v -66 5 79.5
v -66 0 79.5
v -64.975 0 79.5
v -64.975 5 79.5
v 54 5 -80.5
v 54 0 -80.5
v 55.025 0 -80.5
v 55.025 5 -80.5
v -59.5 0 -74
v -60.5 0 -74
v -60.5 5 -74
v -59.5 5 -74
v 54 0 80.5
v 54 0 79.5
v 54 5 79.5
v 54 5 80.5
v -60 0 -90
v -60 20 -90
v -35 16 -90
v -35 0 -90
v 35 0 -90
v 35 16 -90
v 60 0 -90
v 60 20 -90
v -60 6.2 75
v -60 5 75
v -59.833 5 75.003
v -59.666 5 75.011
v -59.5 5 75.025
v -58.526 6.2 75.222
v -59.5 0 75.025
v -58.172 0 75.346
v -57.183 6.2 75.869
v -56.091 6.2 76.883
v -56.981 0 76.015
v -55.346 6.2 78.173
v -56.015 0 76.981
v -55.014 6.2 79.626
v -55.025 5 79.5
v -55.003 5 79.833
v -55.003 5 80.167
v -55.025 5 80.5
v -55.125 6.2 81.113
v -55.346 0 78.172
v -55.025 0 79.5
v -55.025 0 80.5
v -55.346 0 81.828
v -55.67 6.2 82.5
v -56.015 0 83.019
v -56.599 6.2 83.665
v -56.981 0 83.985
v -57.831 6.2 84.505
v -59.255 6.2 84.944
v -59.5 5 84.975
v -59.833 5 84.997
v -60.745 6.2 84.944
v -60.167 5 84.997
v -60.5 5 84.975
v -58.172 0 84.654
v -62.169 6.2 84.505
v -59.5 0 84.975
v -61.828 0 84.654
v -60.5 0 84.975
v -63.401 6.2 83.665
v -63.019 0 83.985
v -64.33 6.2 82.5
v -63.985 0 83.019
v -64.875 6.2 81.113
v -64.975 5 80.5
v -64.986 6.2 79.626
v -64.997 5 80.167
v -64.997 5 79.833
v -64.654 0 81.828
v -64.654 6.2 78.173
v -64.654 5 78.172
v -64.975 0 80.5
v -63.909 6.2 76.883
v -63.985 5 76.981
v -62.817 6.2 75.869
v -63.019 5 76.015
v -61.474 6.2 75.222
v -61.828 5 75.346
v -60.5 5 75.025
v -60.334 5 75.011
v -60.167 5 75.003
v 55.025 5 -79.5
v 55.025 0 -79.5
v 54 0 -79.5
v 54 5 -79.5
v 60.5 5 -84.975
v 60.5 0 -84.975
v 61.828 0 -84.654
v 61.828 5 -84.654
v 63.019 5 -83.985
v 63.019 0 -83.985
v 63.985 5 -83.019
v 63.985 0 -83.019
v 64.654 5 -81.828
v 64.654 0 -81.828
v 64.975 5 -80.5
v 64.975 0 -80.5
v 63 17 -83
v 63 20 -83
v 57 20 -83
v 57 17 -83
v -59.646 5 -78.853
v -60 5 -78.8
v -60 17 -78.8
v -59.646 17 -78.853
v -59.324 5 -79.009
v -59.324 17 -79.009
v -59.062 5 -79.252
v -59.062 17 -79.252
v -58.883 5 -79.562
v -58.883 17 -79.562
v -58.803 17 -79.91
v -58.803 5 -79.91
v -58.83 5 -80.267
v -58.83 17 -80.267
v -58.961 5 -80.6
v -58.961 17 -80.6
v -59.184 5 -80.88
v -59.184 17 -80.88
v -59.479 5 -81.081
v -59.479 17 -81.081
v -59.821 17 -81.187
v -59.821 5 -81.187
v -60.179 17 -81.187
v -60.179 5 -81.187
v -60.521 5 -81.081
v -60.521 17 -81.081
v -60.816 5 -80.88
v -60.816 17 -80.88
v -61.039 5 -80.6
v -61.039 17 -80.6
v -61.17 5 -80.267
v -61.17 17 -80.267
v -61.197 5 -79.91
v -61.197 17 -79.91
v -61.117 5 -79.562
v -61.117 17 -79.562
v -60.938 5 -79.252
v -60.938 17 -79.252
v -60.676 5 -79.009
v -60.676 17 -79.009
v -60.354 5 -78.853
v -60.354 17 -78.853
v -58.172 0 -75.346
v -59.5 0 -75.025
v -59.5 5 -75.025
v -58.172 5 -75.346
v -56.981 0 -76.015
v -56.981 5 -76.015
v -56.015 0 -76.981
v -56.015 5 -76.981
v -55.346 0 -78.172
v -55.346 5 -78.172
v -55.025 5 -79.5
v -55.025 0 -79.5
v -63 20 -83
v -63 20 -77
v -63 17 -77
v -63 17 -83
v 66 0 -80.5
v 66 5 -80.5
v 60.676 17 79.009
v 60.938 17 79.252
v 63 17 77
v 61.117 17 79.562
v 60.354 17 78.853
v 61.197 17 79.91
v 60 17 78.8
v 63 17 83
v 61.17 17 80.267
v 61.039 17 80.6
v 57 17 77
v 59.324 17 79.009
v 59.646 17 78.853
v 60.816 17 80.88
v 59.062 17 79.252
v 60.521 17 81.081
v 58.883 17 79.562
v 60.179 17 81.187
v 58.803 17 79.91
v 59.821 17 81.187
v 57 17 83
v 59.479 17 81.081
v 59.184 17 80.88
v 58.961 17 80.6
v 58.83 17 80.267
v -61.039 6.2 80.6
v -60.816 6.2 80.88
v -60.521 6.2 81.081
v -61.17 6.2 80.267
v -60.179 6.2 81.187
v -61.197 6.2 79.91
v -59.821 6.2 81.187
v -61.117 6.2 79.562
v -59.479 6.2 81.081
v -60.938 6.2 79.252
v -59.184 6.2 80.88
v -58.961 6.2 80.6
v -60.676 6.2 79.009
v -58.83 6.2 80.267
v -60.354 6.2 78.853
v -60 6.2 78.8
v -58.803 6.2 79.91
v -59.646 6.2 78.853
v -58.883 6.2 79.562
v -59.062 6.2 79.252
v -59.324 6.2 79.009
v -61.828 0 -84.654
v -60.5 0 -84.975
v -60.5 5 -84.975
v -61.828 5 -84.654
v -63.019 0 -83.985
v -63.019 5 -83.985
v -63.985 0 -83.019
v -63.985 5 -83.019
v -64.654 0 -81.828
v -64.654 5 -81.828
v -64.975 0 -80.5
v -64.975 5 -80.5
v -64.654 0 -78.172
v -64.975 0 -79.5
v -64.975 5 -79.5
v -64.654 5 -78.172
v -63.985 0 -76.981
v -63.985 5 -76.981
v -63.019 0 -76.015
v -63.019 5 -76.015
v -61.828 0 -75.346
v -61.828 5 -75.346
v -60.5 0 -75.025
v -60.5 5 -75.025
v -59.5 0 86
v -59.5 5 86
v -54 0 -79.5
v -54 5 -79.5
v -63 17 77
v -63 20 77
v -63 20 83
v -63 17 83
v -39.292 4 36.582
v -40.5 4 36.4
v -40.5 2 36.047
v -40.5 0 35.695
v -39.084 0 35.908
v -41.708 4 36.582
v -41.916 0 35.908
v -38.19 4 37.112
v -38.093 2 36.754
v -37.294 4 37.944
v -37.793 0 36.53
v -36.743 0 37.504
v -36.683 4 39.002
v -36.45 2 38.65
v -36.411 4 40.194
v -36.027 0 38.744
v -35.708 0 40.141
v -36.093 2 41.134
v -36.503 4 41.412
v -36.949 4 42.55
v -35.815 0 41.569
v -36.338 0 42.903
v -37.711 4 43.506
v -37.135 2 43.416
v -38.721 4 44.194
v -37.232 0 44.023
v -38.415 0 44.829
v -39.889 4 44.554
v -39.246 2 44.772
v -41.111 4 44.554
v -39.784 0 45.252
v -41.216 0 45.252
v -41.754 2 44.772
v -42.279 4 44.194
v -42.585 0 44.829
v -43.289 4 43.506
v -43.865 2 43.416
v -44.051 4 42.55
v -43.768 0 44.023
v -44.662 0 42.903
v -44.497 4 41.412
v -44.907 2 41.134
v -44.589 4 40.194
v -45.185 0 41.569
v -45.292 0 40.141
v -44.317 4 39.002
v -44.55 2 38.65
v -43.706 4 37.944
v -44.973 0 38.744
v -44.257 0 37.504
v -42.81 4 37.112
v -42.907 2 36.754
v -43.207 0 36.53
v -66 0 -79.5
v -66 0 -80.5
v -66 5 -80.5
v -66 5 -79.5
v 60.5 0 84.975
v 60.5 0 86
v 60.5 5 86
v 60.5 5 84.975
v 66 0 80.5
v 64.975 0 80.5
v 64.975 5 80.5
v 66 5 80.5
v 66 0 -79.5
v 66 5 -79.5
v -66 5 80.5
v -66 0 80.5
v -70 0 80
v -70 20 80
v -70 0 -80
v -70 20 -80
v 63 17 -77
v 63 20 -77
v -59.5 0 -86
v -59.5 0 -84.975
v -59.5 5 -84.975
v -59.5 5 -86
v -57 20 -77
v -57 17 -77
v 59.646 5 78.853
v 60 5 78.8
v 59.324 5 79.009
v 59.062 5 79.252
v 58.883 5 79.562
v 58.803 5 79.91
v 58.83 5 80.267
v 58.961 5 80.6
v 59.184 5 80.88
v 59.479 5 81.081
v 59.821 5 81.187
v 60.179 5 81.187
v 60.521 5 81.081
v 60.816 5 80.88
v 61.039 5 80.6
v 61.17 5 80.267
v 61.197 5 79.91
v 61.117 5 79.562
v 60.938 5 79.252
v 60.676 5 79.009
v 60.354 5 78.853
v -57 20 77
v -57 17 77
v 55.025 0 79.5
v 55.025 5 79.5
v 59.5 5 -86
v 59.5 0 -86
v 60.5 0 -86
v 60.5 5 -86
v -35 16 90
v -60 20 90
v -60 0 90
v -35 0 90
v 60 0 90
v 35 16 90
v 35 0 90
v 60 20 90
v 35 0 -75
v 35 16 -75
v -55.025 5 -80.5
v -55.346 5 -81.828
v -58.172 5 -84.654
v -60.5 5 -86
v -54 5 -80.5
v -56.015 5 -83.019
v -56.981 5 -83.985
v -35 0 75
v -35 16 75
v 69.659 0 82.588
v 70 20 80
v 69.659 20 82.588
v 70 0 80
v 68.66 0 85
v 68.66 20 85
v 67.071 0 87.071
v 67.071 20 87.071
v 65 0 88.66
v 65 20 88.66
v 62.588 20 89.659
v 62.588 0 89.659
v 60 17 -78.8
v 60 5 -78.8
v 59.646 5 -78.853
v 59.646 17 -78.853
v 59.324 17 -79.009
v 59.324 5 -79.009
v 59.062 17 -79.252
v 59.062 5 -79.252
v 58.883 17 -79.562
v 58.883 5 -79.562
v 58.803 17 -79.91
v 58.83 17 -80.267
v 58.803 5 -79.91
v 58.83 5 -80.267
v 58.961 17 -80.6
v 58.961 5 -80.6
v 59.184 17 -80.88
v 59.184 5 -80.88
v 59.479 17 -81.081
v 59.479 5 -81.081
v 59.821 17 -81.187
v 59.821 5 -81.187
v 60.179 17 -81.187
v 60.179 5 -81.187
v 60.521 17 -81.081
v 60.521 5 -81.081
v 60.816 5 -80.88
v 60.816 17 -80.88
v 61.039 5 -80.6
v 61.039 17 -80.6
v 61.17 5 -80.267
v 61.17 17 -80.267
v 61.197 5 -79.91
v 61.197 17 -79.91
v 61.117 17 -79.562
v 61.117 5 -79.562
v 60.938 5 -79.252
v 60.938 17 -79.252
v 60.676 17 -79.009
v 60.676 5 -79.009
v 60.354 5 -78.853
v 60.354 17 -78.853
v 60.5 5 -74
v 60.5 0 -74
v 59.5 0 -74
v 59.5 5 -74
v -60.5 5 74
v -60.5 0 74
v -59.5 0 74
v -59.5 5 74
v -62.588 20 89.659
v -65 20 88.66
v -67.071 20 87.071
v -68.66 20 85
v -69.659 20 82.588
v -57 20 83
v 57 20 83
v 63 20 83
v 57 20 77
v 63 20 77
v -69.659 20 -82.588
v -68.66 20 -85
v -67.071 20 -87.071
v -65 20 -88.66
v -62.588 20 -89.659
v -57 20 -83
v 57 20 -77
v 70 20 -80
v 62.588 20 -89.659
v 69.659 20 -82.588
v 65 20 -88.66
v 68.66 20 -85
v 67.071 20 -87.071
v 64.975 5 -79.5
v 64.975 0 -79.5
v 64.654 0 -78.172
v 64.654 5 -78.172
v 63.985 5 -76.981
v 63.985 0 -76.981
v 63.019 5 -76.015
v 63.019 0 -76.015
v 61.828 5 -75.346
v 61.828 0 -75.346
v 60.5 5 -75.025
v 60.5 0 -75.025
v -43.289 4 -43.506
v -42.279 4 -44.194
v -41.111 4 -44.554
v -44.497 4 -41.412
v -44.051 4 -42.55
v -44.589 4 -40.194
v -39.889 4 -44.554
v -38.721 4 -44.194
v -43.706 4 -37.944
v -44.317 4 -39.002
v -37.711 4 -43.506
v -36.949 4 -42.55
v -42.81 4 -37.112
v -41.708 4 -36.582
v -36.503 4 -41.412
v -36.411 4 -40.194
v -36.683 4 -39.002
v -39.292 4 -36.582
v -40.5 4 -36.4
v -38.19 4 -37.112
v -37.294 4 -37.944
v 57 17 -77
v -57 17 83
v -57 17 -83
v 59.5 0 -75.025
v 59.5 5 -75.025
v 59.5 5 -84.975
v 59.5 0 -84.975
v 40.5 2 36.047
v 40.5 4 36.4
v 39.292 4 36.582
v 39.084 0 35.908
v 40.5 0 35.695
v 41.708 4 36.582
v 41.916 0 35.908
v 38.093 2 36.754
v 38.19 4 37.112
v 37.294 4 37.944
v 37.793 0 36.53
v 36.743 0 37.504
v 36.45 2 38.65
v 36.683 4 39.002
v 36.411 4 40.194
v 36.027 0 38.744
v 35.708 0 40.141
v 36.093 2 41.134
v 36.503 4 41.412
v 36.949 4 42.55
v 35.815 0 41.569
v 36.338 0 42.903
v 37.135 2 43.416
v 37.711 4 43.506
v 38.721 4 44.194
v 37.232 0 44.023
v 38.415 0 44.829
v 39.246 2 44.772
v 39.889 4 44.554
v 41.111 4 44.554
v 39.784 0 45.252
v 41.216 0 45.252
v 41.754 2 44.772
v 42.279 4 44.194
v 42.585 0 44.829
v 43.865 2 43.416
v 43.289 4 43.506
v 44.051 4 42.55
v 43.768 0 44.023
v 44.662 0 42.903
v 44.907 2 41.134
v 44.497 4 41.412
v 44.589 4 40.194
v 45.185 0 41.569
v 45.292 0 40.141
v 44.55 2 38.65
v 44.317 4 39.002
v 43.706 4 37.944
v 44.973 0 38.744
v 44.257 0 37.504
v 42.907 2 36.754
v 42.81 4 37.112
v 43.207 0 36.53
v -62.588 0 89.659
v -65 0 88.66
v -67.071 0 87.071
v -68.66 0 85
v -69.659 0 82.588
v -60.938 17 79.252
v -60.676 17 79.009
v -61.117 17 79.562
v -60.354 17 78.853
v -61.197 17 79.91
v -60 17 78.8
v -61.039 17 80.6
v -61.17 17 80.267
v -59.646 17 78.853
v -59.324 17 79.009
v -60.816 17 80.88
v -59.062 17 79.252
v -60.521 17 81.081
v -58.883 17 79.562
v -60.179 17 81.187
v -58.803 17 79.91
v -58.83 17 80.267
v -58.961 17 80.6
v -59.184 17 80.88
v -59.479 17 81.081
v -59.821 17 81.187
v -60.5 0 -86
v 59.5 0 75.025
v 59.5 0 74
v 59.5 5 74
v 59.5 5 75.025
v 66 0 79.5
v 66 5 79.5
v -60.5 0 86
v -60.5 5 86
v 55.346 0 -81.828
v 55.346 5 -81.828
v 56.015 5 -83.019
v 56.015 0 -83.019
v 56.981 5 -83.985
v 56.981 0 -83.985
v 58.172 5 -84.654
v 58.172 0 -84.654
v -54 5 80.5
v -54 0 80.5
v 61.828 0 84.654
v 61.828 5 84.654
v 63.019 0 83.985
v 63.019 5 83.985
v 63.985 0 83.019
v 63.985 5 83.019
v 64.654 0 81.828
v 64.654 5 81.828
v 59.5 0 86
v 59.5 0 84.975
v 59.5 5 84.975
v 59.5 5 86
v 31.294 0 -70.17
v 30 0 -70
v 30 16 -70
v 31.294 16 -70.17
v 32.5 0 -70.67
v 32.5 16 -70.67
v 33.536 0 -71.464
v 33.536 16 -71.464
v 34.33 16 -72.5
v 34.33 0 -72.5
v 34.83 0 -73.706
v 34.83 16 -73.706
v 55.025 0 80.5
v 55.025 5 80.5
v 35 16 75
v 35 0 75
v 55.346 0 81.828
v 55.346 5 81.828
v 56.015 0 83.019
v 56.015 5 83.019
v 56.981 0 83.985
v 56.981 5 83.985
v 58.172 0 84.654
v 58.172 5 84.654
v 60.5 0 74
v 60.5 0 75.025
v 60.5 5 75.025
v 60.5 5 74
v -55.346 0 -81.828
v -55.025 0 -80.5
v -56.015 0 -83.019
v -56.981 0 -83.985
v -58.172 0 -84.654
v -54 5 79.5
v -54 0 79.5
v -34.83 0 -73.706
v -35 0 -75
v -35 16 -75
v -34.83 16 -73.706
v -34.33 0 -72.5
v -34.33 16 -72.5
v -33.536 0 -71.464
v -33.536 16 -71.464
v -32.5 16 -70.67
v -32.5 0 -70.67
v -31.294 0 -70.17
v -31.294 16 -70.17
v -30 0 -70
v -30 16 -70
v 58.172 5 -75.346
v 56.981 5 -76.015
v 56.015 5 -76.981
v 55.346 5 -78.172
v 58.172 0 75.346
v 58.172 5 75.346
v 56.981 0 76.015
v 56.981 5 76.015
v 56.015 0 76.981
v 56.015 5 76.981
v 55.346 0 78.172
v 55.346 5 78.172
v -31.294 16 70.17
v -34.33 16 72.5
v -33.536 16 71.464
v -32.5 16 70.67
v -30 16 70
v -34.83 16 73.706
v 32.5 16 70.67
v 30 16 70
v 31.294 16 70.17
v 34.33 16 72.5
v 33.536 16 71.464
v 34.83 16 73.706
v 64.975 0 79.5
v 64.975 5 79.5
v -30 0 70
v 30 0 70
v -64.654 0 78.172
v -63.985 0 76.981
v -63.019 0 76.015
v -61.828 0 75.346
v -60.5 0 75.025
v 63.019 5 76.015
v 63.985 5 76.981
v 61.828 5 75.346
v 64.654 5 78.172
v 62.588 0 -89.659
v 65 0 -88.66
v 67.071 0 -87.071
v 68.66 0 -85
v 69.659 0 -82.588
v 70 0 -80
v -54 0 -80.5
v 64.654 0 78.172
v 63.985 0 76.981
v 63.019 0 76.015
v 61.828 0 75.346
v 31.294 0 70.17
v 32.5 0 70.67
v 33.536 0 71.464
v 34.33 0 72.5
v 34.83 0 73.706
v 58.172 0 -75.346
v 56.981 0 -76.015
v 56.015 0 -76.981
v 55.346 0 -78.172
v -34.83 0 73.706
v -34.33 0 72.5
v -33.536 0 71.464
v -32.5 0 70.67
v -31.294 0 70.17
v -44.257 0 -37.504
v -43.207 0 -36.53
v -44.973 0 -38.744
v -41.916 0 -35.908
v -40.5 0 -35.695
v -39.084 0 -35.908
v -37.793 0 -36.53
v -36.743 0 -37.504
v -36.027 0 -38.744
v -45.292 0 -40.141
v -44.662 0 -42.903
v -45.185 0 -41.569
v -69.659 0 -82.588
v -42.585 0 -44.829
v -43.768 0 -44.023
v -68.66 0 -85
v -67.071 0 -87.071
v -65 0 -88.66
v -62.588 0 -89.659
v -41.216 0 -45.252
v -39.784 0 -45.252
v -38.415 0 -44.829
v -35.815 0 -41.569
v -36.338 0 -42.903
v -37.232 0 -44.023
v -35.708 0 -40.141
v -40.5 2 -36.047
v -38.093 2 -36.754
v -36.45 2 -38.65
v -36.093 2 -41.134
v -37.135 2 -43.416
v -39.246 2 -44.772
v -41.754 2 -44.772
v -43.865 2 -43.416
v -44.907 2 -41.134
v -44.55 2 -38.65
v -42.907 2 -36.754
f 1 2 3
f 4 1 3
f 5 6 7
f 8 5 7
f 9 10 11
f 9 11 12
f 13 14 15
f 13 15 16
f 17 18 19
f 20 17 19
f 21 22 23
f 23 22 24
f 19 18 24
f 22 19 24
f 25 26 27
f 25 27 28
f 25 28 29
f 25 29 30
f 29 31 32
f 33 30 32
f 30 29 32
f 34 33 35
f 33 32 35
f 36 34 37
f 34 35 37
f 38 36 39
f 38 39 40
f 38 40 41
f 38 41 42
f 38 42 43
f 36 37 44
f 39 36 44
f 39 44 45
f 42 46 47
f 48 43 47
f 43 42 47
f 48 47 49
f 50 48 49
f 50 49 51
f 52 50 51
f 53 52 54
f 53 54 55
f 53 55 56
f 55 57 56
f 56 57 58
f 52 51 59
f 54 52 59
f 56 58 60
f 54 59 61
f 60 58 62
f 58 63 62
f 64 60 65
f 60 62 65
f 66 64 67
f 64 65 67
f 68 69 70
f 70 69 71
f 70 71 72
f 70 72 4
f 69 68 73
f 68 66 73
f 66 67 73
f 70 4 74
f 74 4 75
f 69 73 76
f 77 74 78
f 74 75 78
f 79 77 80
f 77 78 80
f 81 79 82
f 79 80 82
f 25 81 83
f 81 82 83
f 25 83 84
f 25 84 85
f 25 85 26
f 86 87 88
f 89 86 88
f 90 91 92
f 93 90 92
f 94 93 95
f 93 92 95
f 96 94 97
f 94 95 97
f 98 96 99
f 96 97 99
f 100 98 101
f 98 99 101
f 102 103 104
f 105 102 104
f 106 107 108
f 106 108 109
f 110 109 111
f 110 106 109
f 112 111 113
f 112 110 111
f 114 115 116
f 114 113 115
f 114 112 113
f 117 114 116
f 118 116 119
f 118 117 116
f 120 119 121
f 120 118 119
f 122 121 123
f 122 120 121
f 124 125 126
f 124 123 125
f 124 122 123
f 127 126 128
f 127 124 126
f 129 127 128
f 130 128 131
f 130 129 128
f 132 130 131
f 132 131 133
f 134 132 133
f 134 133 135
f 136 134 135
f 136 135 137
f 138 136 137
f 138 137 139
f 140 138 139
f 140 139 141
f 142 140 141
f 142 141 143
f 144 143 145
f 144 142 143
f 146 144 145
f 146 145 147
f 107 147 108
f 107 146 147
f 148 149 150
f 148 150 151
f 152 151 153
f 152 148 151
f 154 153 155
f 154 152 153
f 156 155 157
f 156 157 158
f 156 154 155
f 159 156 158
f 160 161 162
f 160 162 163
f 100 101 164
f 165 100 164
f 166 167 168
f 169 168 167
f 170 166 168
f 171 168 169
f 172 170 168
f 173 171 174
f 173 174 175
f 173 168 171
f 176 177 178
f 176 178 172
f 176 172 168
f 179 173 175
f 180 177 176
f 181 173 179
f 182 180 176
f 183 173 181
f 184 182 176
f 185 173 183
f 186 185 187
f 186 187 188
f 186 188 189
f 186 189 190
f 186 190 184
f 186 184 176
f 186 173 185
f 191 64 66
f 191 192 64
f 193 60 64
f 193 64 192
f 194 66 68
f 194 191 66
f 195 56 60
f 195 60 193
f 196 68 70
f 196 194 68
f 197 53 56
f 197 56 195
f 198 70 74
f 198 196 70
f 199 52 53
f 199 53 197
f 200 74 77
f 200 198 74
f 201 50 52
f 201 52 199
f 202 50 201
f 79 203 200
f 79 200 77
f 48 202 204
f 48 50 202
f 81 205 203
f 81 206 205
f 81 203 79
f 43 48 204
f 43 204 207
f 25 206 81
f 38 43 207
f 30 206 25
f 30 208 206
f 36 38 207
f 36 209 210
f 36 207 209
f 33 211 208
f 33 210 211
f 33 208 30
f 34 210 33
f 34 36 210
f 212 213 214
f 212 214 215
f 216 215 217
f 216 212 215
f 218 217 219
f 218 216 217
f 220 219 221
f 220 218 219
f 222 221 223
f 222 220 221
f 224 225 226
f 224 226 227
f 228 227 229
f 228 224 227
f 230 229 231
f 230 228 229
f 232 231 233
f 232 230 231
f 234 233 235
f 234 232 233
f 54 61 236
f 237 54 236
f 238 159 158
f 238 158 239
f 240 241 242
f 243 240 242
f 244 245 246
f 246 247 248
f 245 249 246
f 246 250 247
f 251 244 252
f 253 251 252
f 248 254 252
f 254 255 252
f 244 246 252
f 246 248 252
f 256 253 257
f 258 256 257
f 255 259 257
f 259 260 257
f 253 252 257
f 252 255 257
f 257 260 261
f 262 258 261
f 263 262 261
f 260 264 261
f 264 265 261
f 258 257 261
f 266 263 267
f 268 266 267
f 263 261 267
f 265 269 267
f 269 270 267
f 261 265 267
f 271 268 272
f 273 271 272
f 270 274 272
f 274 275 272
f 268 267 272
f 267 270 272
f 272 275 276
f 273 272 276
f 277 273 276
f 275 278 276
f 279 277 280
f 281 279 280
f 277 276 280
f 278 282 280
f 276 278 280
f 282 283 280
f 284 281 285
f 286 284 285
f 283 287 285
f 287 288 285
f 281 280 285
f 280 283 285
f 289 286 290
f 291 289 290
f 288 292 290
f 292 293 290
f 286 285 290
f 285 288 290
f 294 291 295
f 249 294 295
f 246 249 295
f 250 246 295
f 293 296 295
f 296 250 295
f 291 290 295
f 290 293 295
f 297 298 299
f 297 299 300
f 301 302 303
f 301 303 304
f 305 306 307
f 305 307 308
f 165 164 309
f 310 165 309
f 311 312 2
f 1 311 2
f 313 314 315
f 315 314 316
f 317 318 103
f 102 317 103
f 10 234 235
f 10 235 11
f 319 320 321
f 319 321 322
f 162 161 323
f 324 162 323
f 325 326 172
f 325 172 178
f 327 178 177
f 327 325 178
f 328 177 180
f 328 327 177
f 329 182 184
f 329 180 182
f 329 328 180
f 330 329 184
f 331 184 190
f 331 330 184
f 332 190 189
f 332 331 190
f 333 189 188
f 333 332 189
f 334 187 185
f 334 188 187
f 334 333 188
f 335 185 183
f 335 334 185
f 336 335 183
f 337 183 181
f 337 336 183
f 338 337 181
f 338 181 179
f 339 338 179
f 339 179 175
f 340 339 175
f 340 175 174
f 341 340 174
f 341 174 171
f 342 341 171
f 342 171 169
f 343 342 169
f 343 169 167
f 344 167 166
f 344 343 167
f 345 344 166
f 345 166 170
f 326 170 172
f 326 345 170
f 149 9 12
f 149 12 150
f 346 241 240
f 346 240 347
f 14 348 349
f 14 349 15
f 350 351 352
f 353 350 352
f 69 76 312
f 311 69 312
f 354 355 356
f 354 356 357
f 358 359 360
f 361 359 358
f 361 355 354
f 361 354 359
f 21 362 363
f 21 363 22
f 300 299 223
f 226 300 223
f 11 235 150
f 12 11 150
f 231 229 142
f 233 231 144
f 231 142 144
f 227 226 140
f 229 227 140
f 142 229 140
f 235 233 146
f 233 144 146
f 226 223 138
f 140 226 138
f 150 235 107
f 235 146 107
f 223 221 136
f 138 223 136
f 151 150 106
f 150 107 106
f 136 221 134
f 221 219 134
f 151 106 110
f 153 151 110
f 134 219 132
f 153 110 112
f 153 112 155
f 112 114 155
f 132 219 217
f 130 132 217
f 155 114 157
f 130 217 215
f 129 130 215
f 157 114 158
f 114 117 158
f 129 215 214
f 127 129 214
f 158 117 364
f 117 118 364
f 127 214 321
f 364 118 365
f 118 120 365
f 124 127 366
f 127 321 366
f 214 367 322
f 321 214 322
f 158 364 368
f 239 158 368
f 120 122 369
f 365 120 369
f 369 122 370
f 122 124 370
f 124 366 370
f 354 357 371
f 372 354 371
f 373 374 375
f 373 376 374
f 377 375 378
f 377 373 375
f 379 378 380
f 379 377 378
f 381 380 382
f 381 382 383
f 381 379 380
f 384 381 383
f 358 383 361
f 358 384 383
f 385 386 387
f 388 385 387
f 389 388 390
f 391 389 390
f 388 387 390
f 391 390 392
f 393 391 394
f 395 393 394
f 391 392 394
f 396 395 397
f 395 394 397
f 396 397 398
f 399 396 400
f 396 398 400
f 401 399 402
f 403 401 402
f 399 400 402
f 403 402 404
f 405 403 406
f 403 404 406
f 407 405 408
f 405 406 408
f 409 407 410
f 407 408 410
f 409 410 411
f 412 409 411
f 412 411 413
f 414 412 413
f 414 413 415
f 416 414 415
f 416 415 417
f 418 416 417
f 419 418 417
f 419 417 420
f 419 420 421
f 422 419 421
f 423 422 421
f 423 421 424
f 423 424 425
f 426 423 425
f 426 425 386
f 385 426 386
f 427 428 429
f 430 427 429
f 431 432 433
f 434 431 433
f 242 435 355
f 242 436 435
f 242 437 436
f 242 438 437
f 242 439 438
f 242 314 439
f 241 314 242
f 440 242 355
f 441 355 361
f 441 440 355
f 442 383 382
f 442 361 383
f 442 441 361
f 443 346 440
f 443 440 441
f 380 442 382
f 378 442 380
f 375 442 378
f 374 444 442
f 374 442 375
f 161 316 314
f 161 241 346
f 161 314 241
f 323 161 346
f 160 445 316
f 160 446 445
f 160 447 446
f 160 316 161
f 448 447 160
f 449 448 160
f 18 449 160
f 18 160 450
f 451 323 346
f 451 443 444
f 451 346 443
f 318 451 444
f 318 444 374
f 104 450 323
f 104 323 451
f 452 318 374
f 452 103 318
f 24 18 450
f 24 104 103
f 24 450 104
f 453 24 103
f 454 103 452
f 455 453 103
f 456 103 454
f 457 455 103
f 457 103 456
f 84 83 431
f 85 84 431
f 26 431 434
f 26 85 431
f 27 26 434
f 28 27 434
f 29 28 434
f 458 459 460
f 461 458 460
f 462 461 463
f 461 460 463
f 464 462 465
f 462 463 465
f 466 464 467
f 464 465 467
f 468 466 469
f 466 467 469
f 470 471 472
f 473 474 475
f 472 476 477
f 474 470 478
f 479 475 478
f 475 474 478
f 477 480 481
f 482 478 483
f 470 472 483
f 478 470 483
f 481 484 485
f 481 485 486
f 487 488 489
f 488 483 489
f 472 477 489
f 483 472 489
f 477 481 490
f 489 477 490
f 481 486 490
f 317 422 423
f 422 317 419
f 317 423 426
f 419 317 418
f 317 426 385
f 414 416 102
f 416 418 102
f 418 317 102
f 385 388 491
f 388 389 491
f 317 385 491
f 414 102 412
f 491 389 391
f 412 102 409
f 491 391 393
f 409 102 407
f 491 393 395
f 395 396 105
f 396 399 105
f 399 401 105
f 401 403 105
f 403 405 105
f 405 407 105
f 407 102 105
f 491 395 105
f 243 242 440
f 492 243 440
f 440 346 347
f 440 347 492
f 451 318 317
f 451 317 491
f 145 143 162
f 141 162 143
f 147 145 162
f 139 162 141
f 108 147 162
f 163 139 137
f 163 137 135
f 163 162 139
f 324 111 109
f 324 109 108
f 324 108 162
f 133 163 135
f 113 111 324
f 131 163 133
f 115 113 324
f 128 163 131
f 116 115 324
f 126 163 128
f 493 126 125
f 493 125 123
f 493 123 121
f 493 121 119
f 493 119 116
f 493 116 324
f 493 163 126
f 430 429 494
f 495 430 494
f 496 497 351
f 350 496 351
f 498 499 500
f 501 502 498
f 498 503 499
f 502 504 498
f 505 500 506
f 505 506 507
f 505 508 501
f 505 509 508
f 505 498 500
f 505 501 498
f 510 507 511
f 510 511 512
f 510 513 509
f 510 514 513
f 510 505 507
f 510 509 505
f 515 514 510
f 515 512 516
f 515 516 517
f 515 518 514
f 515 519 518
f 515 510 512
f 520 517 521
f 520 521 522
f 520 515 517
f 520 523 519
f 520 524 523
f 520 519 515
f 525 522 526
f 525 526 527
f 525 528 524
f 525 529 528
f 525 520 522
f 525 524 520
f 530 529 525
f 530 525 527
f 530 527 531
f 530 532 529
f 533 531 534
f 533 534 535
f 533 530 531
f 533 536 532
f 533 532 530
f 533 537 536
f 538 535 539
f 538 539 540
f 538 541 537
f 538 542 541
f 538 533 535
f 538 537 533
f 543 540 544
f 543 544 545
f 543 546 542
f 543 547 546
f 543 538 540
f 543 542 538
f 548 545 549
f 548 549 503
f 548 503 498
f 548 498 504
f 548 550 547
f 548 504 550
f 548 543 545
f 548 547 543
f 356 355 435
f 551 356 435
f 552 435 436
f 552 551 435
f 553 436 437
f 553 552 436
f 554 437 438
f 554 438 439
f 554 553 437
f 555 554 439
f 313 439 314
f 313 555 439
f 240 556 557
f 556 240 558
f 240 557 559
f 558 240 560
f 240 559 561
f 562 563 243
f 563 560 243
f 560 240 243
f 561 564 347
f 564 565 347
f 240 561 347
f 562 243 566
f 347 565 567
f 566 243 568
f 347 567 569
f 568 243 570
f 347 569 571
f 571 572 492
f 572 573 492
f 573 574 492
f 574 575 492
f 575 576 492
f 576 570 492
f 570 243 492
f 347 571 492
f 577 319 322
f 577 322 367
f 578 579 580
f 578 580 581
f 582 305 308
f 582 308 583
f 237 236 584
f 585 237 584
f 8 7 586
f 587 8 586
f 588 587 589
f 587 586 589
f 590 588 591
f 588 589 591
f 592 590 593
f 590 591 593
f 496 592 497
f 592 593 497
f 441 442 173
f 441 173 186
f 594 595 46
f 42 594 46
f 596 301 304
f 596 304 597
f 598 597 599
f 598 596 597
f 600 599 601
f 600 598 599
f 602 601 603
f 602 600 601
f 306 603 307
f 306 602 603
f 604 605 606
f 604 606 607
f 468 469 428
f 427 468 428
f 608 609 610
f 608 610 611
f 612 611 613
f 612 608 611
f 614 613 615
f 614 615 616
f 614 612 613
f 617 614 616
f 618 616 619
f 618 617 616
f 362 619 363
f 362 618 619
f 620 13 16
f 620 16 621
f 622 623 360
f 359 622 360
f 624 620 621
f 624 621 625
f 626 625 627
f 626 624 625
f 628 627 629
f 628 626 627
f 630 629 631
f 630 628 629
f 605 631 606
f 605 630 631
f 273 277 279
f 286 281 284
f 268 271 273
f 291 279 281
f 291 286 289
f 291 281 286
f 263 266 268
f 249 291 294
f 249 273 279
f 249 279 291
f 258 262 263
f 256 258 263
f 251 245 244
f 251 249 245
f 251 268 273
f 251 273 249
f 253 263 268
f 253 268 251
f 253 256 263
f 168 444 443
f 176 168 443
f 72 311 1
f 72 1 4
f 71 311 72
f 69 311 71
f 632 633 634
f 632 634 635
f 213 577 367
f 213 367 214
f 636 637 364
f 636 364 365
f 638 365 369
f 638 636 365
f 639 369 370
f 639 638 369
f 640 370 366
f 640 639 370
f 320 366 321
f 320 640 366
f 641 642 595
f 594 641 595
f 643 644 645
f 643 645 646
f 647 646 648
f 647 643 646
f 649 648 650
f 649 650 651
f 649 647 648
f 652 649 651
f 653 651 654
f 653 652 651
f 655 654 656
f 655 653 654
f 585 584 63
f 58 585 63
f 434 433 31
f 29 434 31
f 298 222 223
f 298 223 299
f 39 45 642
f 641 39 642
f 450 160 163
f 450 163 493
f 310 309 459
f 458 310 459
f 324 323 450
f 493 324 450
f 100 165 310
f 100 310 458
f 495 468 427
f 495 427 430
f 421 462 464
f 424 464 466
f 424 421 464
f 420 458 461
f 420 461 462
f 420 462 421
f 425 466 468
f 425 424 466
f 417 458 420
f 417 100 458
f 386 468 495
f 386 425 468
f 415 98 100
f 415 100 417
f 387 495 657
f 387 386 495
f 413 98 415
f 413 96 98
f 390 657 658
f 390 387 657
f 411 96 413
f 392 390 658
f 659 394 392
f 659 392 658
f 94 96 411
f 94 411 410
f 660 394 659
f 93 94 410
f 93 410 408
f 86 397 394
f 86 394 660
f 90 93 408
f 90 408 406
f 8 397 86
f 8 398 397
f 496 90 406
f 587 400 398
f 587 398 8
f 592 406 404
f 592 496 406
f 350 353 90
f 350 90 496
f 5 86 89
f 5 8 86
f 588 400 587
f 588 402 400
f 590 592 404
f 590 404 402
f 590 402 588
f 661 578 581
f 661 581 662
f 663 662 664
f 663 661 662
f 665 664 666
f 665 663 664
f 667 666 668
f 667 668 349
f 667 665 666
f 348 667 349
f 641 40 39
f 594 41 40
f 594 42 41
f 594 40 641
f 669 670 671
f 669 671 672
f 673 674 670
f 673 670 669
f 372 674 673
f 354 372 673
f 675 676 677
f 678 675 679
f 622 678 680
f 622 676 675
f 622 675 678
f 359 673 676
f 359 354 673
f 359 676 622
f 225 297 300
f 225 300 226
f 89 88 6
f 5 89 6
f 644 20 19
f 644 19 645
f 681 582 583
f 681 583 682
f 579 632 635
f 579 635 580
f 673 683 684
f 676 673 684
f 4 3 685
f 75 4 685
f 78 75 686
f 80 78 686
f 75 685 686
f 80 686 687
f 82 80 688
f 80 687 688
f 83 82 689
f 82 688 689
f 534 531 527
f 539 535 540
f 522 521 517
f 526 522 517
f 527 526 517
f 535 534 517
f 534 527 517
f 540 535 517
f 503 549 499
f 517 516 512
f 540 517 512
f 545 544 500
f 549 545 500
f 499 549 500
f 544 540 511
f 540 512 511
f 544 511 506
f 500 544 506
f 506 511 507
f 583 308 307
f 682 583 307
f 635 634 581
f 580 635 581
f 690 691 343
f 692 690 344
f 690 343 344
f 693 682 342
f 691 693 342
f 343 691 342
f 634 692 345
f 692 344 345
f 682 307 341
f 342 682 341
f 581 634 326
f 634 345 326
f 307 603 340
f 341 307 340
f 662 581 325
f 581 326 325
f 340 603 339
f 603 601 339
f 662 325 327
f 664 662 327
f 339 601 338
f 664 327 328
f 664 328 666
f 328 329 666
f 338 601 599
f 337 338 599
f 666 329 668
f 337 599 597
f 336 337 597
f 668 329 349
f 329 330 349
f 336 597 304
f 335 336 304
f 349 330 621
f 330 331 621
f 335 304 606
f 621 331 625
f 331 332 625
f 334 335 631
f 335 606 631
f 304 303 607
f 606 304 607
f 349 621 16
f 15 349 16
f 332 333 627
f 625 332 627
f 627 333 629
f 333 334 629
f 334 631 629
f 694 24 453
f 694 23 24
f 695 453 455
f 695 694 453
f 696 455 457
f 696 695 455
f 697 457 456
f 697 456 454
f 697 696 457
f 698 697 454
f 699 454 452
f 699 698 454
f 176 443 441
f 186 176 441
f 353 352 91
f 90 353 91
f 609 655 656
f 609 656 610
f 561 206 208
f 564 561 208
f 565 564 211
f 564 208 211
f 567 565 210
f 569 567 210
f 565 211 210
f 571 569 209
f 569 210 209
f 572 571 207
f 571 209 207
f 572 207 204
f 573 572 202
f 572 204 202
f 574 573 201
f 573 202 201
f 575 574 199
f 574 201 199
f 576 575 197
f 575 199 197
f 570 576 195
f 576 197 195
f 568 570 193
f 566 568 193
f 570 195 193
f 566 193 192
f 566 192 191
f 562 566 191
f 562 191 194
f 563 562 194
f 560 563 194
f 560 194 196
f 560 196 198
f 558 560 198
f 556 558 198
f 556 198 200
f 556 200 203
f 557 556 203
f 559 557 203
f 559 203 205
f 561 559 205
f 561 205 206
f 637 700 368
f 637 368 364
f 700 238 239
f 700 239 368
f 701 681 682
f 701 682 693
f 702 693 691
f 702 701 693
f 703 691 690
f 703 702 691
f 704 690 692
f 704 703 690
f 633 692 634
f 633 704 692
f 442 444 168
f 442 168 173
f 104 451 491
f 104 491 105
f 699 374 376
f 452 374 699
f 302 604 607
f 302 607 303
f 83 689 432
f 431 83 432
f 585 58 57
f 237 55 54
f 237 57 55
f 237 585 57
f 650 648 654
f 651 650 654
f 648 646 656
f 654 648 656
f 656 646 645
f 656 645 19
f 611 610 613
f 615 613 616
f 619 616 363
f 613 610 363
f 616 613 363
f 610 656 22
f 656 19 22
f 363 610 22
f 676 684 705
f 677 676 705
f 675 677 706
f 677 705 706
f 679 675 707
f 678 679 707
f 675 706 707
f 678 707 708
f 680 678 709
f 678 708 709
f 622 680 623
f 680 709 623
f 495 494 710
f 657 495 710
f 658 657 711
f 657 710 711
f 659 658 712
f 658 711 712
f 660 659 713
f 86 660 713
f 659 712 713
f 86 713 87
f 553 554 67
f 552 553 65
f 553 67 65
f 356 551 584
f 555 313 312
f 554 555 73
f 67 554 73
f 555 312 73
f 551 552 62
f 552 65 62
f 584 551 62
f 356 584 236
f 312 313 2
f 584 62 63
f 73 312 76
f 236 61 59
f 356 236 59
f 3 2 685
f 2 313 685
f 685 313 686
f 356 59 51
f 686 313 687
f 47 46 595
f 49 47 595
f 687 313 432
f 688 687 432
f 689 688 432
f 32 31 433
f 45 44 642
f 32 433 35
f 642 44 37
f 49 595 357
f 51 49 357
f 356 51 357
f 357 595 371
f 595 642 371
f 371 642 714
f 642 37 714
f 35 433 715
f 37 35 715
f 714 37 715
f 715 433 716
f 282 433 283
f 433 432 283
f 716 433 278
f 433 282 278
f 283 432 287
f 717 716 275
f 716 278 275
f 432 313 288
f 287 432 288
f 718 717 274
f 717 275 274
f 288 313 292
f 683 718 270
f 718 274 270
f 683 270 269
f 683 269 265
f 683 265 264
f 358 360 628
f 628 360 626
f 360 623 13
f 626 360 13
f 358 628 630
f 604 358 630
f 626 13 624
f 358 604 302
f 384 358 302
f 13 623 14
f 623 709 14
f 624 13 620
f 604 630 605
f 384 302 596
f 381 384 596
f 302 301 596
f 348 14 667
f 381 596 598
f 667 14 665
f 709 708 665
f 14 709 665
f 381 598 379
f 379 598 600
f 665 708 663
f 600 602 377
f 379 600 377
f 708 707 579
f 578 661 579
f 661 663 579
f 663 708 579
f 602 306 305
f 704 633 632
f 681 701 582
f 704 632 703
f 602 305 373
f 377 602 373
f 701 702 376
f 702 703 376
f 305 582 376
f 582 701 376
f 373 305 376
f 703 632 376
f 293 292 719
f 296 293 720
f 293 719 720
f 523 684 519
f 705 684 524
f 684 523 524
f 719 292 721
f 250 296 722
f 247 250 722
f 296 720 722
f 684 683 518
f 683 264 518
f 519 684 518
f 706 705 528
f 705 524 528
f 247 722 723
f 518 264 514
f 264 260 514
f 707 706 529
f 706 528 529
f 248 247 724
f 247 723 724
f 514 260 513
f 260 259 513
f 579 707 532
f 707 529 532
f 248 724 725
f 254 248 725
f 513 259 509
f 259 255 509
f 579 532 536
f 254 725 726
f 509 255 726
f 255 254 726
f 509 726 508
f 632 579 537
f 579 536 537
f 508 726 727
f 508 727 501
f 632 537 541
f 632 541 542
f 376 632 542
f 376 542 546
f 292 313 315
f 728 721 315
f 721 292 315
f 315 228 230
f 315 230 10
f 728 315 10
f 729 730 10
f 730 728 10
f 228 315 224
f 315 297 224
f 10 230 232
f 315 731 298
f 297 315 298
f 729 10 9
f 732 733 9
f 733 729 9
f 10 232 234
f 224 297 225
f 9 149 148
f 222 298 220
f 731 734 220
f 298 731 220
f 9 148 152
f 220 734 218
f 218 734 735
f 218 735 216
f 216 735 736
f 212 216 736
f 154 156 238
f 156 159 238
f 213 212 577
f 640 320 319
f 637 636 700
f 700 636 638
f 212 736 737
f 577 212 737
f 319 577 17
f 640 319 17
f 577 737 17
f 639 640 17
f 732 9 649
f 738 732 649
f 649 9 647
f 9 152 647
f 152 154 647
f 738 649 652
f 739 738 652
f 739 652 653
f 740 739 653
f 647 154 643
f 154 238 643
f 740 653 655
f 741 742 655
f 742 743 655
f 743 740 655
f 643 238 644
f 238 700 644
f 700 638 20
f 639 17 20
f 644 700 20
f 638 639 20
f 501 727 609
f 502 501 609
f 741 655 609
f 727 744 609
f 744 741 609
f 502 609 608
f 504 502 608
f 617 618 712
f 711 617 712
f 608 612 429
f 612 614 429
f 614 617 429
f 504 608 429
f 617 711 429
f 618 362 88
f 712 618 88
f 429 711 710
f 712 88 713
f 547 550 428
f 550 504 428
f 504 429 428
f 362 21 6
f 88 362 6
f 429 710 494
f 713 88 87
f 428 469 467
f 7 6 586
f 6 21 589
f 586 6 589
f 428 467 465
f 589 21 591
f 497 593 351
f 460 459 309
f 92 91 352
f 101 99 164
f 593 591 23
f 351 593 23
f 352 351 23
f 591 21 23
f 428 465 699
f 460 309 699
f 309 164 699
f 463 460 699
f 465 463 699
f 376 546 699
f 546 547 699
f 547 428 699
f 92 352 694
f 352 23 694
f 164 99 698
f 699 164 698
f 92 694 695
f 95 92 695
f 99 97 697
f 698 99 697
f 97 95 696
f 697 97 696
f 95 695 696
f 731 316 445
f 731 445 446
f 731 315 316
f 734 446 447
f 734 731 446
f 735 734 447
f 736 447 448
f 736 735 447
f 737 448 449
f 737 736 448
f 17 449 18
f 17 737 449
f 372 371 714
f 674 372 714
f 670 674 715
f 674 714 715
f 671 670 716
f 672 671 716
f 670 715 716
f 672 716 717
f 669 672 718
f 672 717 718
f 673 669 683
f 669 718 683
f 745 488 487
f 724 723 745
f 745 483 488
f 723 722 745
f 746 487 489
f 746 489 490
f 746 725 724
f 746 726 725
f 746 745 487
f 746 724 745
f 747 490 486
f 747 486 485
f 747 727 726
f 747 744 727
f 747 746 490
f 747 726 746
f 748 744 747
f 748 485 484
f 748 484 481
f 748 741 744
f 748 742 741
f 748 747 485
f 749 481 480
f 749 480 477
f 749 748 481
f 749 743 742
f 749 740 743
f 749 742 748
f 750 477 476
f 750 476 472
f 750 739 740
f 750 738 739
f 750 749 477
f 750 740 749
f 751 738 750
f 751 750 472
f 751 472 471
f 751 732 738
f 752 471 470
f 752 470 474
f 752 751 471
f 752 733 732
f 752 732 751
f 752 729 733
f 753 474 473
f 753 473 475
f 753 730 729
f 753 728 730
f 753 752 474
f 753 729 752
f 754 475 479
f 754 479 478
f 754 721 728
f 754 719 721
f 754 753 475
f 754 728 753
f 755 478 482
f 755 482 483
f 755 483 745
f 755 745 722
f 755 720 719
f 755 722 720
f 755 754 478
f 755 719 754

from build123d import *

# Parameters (mm, degrees)
SKETCH_1_W                                 = 200
SKETCH_1_H                                 = 200
EXTRUDE_1_DEPTH                            = 20
SKETCH_2_W                                 = 200
SKETCH_2_H                                 = 200
SKETCH_2_W_2                               = 140
SKETCH_2_H_2                               = 180
CUT_EXTRUDE_2_DEPTH                        = 143.828568571
FILLET_1_R                                 = 10
FILLET_2_R                                 = 10
FILLET_3_R                                 = 10
FILLET_4_R                                 = 10
CUT_EXTRUDE_4_DEPTH                        = 5
MIRROR_3_AT_THE_SECOND_PLANE_COPY_1_DEPTH  = 5
SKETCH_5_R                                 = 5
CUT_EXTRUDE_5_DEPTH                        = 6.2
CUT_EXTRUDE_7_DEPTH                        = 16
SKETCH_8_R                                 = 4.1
CUT_EXTRUDE_8_DEPTH                        = 4
DRAFT_2_ANGLE                              = 10
DRAFT_2_OF_MIRROR_10_2_ANGLE               = 10
DRAFT_2_OF_MIRROR_11_2_ANGLE               = 10
SKETCH_14_W                                = 6
SKETCH_14_H                                = 6
CUT_EXTRUDE_9_DEPTH                        = 3
MIRROR_12_AT_THE_SECOND_PLANE_COPY_1_SKE_W = 6
MIRROR_12_AT_THE_SECOND_PLANE_COPY_1_SKE_H = 6
MIRROR_12_AT_THE_SECOND_PLANE_COPY_1_DEPTH = 3
SKETCH_18_R                                = 1.2
CUT_EXTRUDE_11_DEPTH                       = 116.758369028
MIRROR_16_AT_THE_SECOND_PLANE_COPY_1_SKE_R = 1.2
MIRROR_16_AT_THE_SECOND_PLANE_COPY_1_DEPTH = 116.758369028


with BuildPart() as part:
    # 草图1 → 凸台-拉伸1 (new body)
    with BuildSketch(Plane(origin=(0, 0, 0), x_dir=(1, 0, 0), z_dir=(0, 1, 0))):
        Rectangle(SKETCH_1_W, SKETCH_1_H)
    extrude(amount=EXTRUDE_1_DEPTH)

    # 草图2 → 切除-拉伸2 (cut, through all)
    with BuildSketch(Plane(origin=(0, 20, 0), x_dir=(1, 0, 0), z_dir=(0, 1, 0))):
        Rectangle(SKETCH_2_W, SKETCH_2_H)
        Rectangle(SKETCH_2_W_2, SKETCH_2_H_2, mode=Mode.SUBTRACT)
    extrude(amount=-CUT_EXTRUDE_2_DEPTH, mode=Mode.SUBTRACT)

    # 圆角1
    fillet_1_edges = [part.edges().sort_by_distance(p)[0] for p in [
        (-70, 10, -90),
    ]]
    fillet(fillet_1_edges, radius=FILLET_1_R)

    # 圆角2
    fillet_2_edges = [part.edges().sort_by_distance(p)[0] for p in [
        (70, 10, -90),
    ]]
    fillet(fillet_2_edges, radius=FILLET_2_R)

    # 圆角3
    fillet_3_edges = [part.edges().sort_by_distance(p)[0] for p in [
        (70, 10, 90),
    ]]
    fillet(fillet_3_edges, radius=FILLET_3_R)

    # 圆角4
    fillet_4_edges = [part.edges().sort_by_distance(p)[0] for p in [
        (-70, 10, 90),
    ]]
    fillet(fillet_4_edges, radius=FILLET_4_R)

    # 草图4 → 切除-拉伸4 (cut)
    with BuildSketch(Plane.XZ):
        with BuildLine():
            Line((-59.5, 84.974937186), (-59.5, 86))
            Line((-59.5, 86), (-60.5, 86))
            Line((-60.5, 86), (-60.5, 84.974937186))
            ThreePointArc((-60.5, 84.974937186), (-63.535533906, 83.535533906), (-64.974937186, 80.5))
            Line((-64.974937186, 80.5), (-66, 80.5))
            Line((-66, 80.5), (-66, 79.5))
            Line((-66, 79.5), (-64.974937186, 79.5))
            ThreePointArc((-64.974937186, 79.5), (-63.535533906, 76.464466094), (-60.5, 75.025062814))
            Line((-60.5, 75.025062814), (-60.5, 74))
            Line((-60.5, 74), (-59.5, 74))
            Line((-59.5, 74), (-59.5, 75.025062814))
            ThreePointArc((-59.5, 75.025062814), (-56.464466094, 76.464466094), (-55.025062814, 79.5))
            Line((-55.025062814, 79.5), (-54, 79.5))
            Line((-54, 79.5), (-54, 80.5))
            Line((-54, 80.5), (-55.025062814, 80.5))
            ThreePointArc((-55.025062814, 80.5), (-56.464466094, 83.535533906), (-59.5, 84.974937186))
        make_face()
    cut_extrude_4 = extrude(amount=-CUT_EXTRUDE_4_DEPTH, mode=Mode.SUBTRACT)

    # 镜向3: 切除-拉伸4 across plane
    add(cut_extrude_4.mirror(Plane(origin=(0, 0, 0), x_dir=(0, 0, 1), z_dir=(1, 0, 0))), mode=Mode.SUBTRACT)

    # 镜向3 at the second plane: 切除-拉伸4 across plane
    add(cut_extrude_4.mirror(Plane.XY), mode=Mode.SUBTRACT)

    # 镜向3 at the second plane copy 1 sket → 镜向3 at the second plane copy 1 (cut)
    with BuildSketch(Plane(origin=(0, 0, 0), x_dir=(-1, 0, 0), z_dir=(0, -1, 0))):
        with BuildLine():
            Line((-59.5, 84.974937186), (-59.5, 86))
            Line((-59.5, 86), (-60.5, 86))
            Line((-60.5, 86), (-60.5, 84.974937186))
            ThreePointArc((-60.5, 84.974937186), (-63.535533906, 83.535533906), (-64.974937186, 80.5))
            Line((-64.974937186, 80.5), (-66, 80.5))
            Line((-66, 80.5), (-66, 79.5))
            Line((-66, 79.5), (-64.974937186, 79.5))
            ThreePointArc((-64.974937186, 79.5), (-63.535533906, 76.464466094), (-60.5, 75.025062814))
            Line((-60.5, 75.025062814), (-60.5, 74))
            Line((-60.5, 74), (-59.5, 74))
            Line((-59.5, 74), (-59.5, 75.025062814))
            ThreePointArc((-59.5, 75.025062814), (-56.464466094, 76.464466094), (-55.025062814, 79.5))
            Line((-55.025062814, 79.5), (-54, 79.5))
            Line((-54, 79.5), (-54, 80.5))
            Line((-54, 80.5), (-55.025062814, 80.5))
            ThreePointArc((-55.025062814, 80.5), (-56.464466094, 83.535533906), (-59.5, 84.974937186))
        make_face()
    extrude(amount=-MIRROR_3_AT_THE_SECOND_PLANE_COPY_1_DEPTH, mode=Mode.SUBTRACT)

    # 草图5 → 切除-拉伸5 (cut)
    with BuildSketch(Plane.XZ):
        with Locations(Location((-60, 80, 0), (0, 0, 270))):
            Circle(SKETCH_5_R)
    extrude(amount=-CUT_EXTRUDE_5_DEPTH, mode=Mode.SUBTRACT)

    # 草图7 → 切除-拉伸7 (cut)
    with BuildSketch(Plane.XZ):
        with BuildLine():
            Line((35, 110), (-35, 110))
            Line((-35, 110), (-35, 75))
            ThreePointArc((-35, 75), (-33.535533906, 71.464466094), (-30, 70))
            Line((-30, 70), (30, 70))
            ThreePointArc((30, 70), (33.535533906, 71.464466094), (35, 75))
            Line((35, 75), (35, 110))
        make_face()
    cut_extrude_7 = extrude(amount=-CUT_EXTRUDE_7_DEPTH, mode=Mode.SUBTRACT)

    # 镜向6: 切除-拉伸7 across plane
    add(cut_extrude_7.mirror(Plane.XY), mode=Mode.SUBTRACT)

    # 草图8 → 切除-拉伸8 (cut)
    with BuildSketch(Plane.XZ):
        with Locations(Location((-40.5, 40.5, 0), (0, 0, 270))):
            Circle(SKETCH_8_R)
    cut_extrude_8 = extrude(amount=-CUT_EXTRUDE_8_DEPTH, mode=Mode.SUBTRACT)

    # 拔模2
    draft_2_faces = [part.faces().sort_by_distance(p)[0] for p in [
        (-40.5, 2, 44.6),
    ]]
    draft(draft_2_faces, Plane(origin=(-40.5, 4, 40.5), x_dir=(0, 0, -1), z_dir=(0, -1, 0)), DRAFT_2_ANGLE)

    # 镜向10: 切除-拉伸8 across plane
    add(cut_extrude_8.mirror(Plane(origin=(0, 0, 0), x_dir=(0, 0, 1), z_dir=(1, 0, 0))), mode=Mode.SUBTRACT)

    # 拔模2 of Mirror 10 2
    draft_2_of_mirror_10_2_faces = [part.faces().sort_by_distance(p)[0] for p in [
        (40.5, 2, 44.6),
    ]]
    draft(draft_2_of_mirror_10_2_faces, Plane(origin=(40.5, 4, 40.5), x_dir=(0, 0, -1), z_dir=(0, -1, 0)), DRAFT_2_OF_MIRROR_10_2_ANGLE)

    # 镜向11: 切除-拉伸8 across plane
    add(cut_extrude_8.mirror(Plane.XY), mode=Mode.SUBTRACT)

    # 拔模2 of Mirror 11 2
    draft_2_of_mirror_11_2_faces = [part.faces().sort_by_distance(p)[0] for p in [
        (-40.5, 2, -44.6),
    ]]
    draft(draft_2_of_mirror_11_2_faces, Plane(origin=(-40.5, 4, -40.5), x_dir=(0, 0, 1), z_dir=(0, -1, 0)), DRAFT_2_OF_MIRROR_11_2_ANGLE)

    # 草图14 → 切除-拉伸9 (cut)
    with BuildSketch(Plane(origin=(0, 20, 0), x_dir=(1, 0, 0), z_dir=(0, 1, 0))):
        with Locations((-60, 80)):
            Rectangle(SKETCH_14_W, SKETCH_14_H)
    cut_extrude_9 = extrude(amount=-CUT_EXTRUDE_9_DEPTH, mode=Mode.SUBTRACT)

    # 镜向12: 切除-拉伸9 across plane
    add(cut_extrude_9.mirror(Plane(origin=(0, 0, 0), x_dir=(0, 0, 1), z_dir=(1, 0, 0))), mode=Mode.SUBTRACT)

    # 镜向12 at the second plane: 切除-拉伸9 across plane
    add(cut_extrude_9.mirror(Plane.XY), mode=Mode.SUBTRACT)

    # 镜向12 at the second plane copy 1 ske → 镜向12 at the second plane copy 1 (cut)
    with BuildSketch(Plane(origin=(0, 20, 0), x_dir=(-1, 0, 0), z_dir=(0, 1, 0))):
        with Locations((-60, 80)):
            Rectangle(MIRROR_12_AT_THE_SECOND_PLANE_COPY_1_SKE_W, MIRROR_12_AT_THE_SECOND_PLANE_COPY_1_SKE_H)
    extrude(amount=-MIRROR_12_AT_THE_SECOND_PLANE_COPY_1_DEPTH, mode=Mode.SUBTRACT)

    # 草图18 → 切除-拉伸11 (cut, through all)
    with BuildSketch(Plane.XZ):
        with Locations(Location((-60, 80, 0), (0, 0, 270))):
            Circle(SKETCH_18_R)
    cut_extrude_11 = extrude(amount=-CUT_EXTRUDE_11_DEPTH, mode=Mode.SUBTRACT)

    # 镜向16: 切除-拉伸11 across plane
    add(cut_extrude_11.mirror(Plane(origin=(0, 0, 0), x_dir=(0, 0, 1), z_dir=(1, 0, 0))), mode=Mode.SUBTRACT)

    # 镜向16 at the second plane: 切除-拉伸11 across plane
    add(cut_extrude_11.mirror(Plane.XY), mode=Mode.SUBTRACT)

    # 镜向16 at the second plane copy 1 ske → 镜向16 at the second plane copy 1 (cut, through all)
    with BuildSketch(Plane(origin=(0, 0, 0), x_dir=(-1, 0, 0), z_dir=(0, -1, 0))):
        with Locations(Location((-60, 80, 0), (0, 0, 270))):
            Circle(MIRROR_16_AT_THE_SECOND_PLANE_COPY_1_SKE_R)
    extrude(amount=-MIRROR_16_AT_THE_SECOND_PLANE_COPY_1_DEPTH, mode=Mode.SUBTRACT)


solid = part.part
